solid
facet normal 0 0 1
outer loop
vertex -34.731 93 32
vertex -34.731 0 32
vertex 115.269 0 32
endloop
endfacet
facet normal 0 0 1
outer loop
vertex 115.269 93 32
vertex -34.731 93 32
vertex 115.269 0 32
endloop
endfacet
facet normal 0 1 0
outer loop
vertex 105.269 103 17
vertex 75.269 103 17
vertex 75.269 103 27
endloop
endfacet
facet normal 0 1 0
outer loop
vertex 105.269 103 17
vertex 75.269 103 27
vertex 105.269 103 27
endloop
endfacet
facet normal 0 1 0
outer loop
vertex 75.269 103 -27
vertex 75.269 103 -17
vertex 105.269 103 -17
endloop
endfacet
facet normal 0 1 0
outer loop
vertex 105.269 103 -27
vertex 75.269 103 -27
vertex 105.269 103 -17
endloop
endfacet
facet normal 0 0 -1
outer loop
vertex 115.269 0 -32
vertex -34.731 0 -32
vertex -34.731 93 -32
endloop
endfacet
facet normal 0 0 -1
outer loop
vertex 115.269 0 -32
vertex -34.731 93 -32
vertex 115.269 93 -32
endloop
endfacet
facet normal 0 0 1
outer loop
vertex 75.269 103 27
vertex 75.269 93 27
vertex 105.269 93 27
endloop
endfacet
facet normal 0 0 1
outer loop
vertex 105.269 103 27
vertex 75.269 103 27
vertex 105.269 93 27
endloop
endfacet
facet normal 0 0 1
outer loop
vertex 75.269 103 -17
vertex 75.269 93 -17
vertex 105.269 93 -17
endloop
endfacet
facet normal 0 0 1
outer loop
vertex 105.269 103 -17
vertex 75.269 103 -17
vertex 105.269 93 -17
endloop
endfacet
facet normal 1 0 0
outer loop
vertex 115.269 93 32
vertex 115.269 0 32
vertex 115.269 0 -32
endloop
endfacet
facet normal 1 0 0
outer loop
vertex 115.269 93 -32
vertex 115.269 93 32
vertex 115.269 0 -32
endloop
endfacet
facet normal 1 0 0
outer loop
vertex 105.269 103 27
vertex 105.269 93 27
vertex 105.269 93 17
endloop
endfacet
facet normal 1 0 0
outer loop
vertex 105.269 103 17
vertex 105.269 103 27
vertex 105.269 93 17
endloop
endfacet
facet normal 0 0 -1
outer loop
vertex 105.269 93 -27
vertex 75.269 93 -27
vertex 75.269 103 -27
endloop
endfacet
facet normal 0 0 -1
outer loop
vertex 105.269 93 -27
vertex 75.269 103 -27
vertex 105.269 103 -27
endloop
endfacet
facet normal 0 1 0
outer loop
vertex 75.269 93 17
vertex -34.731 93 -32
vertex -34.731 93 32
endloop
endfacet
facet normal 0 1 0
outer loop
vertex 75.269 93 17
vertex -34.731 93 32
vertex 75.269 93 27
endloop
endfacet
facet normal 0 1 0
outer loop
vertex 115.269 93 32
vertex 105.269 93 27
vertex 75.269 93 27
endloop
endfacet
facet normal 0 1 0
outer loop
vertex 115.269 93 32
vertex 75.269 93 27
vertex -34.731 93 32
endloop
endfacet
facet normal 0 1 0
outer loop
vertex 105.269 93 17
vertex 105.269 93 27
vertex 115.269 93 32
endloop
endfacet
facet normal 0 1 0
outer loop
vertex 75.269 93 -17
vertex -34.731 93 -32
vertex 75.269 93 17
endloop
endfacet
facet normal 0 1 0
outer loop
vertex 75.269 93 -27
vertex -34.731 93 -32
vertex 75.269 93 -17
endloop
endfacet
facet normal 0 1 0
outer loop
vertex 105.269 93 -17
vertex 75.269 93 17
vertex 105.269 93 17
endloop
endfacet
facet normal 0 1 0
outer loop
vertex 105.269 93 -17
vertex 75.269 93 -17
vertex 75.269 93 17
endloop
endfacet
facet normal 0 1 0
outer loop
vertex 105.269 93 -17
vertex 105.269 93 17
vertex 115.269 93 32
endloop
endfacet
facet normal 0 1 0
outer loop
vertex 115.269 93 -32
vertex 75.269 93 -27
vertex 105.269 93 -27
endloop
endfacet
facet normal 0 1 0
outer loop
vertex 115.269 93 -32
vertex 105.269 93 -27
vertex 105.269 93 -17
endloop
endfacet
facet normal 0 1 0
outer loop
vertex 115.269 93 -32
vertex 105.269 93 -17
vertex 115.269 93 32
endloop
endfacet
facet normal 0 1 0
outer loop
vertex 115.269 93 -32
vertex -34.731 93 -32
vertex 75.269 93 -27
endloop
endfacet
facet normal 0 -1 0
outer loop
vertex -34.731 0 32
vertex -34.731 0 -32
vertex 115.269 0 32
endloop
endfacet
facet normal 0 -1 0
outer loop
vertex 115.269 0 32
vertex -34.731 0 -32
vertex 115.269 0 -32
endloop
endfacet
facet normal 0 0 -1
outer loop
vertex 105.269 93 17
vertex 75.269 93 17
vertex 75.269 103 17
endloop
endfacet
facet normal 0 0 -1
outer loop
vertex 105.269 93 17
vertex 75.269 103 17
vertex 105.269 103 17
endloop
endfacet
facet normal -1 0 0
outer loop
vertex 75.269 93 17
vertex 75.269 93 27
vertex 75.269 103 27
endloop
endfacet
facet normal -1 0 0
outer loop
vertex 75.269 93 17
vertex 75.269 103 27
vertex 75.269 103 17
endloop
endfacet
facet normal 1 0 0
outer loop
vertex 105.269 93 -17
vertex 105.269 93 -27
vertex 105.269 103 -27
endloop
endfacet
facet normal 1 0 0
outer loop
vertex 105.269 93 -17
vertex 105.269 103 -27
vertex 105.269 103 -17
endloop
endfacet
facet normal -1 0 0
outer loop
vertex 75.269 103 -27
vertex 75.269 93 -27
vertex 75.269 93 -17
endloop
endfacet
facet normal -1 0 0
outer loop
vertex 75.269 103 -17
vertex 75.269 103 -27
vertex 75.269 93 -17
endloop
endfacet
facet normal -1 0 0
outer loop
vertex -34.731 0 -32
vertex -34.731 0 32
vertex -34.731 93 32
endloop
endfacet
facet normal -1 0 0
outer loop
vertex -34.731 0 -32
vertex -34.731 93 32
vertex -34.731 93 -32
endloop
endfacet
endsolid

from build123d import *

# Parameters (mm, degrees)
ESQUISSE1_W        = 150
ESQUISSE1_H        = 64
BOSS_EXTRU_1_DEPTH = 93
ESQUISSE2_W        = 30
ESQUISSE2_H        = 10
BOSS_EXTRU_2_DEPTH = 10


with BuildPart() as part:
    # Esquisse1 → Boss.-Extru.1 (new body)
    with BuildSketch(Plane(origin=(0, 0, 0), x_dir=(1, 0, 0), z_dir=(0, 1, 0))):
        with Locations((40.269148016, 0)):
            Rectangle(ESQUISSE1_W, ESQUISSE1_H)
    extrude(amount=BOSS_EXTRU_1_DEPTH)

    # Esquisse2 → Boss.-Extru.2 (add)
    with BuildSketch(Plane(origin=(0, 93, 0), x_dir=(1, 0, 0), z_dir=(0, 1, 0))):
        with Locations((90.269148016, -22)):
            Rectangle(ESQUISSE2_W, ESQUISSE2_H)
    boss_extru_2 = extrude(amount=BOSS_EXTRU_2_DEPTH)

    # Symétrie1: Boss.-Extru.2 across plane
    add(boss_extru_2.mirror(Plane.XY))


solid = part.part
